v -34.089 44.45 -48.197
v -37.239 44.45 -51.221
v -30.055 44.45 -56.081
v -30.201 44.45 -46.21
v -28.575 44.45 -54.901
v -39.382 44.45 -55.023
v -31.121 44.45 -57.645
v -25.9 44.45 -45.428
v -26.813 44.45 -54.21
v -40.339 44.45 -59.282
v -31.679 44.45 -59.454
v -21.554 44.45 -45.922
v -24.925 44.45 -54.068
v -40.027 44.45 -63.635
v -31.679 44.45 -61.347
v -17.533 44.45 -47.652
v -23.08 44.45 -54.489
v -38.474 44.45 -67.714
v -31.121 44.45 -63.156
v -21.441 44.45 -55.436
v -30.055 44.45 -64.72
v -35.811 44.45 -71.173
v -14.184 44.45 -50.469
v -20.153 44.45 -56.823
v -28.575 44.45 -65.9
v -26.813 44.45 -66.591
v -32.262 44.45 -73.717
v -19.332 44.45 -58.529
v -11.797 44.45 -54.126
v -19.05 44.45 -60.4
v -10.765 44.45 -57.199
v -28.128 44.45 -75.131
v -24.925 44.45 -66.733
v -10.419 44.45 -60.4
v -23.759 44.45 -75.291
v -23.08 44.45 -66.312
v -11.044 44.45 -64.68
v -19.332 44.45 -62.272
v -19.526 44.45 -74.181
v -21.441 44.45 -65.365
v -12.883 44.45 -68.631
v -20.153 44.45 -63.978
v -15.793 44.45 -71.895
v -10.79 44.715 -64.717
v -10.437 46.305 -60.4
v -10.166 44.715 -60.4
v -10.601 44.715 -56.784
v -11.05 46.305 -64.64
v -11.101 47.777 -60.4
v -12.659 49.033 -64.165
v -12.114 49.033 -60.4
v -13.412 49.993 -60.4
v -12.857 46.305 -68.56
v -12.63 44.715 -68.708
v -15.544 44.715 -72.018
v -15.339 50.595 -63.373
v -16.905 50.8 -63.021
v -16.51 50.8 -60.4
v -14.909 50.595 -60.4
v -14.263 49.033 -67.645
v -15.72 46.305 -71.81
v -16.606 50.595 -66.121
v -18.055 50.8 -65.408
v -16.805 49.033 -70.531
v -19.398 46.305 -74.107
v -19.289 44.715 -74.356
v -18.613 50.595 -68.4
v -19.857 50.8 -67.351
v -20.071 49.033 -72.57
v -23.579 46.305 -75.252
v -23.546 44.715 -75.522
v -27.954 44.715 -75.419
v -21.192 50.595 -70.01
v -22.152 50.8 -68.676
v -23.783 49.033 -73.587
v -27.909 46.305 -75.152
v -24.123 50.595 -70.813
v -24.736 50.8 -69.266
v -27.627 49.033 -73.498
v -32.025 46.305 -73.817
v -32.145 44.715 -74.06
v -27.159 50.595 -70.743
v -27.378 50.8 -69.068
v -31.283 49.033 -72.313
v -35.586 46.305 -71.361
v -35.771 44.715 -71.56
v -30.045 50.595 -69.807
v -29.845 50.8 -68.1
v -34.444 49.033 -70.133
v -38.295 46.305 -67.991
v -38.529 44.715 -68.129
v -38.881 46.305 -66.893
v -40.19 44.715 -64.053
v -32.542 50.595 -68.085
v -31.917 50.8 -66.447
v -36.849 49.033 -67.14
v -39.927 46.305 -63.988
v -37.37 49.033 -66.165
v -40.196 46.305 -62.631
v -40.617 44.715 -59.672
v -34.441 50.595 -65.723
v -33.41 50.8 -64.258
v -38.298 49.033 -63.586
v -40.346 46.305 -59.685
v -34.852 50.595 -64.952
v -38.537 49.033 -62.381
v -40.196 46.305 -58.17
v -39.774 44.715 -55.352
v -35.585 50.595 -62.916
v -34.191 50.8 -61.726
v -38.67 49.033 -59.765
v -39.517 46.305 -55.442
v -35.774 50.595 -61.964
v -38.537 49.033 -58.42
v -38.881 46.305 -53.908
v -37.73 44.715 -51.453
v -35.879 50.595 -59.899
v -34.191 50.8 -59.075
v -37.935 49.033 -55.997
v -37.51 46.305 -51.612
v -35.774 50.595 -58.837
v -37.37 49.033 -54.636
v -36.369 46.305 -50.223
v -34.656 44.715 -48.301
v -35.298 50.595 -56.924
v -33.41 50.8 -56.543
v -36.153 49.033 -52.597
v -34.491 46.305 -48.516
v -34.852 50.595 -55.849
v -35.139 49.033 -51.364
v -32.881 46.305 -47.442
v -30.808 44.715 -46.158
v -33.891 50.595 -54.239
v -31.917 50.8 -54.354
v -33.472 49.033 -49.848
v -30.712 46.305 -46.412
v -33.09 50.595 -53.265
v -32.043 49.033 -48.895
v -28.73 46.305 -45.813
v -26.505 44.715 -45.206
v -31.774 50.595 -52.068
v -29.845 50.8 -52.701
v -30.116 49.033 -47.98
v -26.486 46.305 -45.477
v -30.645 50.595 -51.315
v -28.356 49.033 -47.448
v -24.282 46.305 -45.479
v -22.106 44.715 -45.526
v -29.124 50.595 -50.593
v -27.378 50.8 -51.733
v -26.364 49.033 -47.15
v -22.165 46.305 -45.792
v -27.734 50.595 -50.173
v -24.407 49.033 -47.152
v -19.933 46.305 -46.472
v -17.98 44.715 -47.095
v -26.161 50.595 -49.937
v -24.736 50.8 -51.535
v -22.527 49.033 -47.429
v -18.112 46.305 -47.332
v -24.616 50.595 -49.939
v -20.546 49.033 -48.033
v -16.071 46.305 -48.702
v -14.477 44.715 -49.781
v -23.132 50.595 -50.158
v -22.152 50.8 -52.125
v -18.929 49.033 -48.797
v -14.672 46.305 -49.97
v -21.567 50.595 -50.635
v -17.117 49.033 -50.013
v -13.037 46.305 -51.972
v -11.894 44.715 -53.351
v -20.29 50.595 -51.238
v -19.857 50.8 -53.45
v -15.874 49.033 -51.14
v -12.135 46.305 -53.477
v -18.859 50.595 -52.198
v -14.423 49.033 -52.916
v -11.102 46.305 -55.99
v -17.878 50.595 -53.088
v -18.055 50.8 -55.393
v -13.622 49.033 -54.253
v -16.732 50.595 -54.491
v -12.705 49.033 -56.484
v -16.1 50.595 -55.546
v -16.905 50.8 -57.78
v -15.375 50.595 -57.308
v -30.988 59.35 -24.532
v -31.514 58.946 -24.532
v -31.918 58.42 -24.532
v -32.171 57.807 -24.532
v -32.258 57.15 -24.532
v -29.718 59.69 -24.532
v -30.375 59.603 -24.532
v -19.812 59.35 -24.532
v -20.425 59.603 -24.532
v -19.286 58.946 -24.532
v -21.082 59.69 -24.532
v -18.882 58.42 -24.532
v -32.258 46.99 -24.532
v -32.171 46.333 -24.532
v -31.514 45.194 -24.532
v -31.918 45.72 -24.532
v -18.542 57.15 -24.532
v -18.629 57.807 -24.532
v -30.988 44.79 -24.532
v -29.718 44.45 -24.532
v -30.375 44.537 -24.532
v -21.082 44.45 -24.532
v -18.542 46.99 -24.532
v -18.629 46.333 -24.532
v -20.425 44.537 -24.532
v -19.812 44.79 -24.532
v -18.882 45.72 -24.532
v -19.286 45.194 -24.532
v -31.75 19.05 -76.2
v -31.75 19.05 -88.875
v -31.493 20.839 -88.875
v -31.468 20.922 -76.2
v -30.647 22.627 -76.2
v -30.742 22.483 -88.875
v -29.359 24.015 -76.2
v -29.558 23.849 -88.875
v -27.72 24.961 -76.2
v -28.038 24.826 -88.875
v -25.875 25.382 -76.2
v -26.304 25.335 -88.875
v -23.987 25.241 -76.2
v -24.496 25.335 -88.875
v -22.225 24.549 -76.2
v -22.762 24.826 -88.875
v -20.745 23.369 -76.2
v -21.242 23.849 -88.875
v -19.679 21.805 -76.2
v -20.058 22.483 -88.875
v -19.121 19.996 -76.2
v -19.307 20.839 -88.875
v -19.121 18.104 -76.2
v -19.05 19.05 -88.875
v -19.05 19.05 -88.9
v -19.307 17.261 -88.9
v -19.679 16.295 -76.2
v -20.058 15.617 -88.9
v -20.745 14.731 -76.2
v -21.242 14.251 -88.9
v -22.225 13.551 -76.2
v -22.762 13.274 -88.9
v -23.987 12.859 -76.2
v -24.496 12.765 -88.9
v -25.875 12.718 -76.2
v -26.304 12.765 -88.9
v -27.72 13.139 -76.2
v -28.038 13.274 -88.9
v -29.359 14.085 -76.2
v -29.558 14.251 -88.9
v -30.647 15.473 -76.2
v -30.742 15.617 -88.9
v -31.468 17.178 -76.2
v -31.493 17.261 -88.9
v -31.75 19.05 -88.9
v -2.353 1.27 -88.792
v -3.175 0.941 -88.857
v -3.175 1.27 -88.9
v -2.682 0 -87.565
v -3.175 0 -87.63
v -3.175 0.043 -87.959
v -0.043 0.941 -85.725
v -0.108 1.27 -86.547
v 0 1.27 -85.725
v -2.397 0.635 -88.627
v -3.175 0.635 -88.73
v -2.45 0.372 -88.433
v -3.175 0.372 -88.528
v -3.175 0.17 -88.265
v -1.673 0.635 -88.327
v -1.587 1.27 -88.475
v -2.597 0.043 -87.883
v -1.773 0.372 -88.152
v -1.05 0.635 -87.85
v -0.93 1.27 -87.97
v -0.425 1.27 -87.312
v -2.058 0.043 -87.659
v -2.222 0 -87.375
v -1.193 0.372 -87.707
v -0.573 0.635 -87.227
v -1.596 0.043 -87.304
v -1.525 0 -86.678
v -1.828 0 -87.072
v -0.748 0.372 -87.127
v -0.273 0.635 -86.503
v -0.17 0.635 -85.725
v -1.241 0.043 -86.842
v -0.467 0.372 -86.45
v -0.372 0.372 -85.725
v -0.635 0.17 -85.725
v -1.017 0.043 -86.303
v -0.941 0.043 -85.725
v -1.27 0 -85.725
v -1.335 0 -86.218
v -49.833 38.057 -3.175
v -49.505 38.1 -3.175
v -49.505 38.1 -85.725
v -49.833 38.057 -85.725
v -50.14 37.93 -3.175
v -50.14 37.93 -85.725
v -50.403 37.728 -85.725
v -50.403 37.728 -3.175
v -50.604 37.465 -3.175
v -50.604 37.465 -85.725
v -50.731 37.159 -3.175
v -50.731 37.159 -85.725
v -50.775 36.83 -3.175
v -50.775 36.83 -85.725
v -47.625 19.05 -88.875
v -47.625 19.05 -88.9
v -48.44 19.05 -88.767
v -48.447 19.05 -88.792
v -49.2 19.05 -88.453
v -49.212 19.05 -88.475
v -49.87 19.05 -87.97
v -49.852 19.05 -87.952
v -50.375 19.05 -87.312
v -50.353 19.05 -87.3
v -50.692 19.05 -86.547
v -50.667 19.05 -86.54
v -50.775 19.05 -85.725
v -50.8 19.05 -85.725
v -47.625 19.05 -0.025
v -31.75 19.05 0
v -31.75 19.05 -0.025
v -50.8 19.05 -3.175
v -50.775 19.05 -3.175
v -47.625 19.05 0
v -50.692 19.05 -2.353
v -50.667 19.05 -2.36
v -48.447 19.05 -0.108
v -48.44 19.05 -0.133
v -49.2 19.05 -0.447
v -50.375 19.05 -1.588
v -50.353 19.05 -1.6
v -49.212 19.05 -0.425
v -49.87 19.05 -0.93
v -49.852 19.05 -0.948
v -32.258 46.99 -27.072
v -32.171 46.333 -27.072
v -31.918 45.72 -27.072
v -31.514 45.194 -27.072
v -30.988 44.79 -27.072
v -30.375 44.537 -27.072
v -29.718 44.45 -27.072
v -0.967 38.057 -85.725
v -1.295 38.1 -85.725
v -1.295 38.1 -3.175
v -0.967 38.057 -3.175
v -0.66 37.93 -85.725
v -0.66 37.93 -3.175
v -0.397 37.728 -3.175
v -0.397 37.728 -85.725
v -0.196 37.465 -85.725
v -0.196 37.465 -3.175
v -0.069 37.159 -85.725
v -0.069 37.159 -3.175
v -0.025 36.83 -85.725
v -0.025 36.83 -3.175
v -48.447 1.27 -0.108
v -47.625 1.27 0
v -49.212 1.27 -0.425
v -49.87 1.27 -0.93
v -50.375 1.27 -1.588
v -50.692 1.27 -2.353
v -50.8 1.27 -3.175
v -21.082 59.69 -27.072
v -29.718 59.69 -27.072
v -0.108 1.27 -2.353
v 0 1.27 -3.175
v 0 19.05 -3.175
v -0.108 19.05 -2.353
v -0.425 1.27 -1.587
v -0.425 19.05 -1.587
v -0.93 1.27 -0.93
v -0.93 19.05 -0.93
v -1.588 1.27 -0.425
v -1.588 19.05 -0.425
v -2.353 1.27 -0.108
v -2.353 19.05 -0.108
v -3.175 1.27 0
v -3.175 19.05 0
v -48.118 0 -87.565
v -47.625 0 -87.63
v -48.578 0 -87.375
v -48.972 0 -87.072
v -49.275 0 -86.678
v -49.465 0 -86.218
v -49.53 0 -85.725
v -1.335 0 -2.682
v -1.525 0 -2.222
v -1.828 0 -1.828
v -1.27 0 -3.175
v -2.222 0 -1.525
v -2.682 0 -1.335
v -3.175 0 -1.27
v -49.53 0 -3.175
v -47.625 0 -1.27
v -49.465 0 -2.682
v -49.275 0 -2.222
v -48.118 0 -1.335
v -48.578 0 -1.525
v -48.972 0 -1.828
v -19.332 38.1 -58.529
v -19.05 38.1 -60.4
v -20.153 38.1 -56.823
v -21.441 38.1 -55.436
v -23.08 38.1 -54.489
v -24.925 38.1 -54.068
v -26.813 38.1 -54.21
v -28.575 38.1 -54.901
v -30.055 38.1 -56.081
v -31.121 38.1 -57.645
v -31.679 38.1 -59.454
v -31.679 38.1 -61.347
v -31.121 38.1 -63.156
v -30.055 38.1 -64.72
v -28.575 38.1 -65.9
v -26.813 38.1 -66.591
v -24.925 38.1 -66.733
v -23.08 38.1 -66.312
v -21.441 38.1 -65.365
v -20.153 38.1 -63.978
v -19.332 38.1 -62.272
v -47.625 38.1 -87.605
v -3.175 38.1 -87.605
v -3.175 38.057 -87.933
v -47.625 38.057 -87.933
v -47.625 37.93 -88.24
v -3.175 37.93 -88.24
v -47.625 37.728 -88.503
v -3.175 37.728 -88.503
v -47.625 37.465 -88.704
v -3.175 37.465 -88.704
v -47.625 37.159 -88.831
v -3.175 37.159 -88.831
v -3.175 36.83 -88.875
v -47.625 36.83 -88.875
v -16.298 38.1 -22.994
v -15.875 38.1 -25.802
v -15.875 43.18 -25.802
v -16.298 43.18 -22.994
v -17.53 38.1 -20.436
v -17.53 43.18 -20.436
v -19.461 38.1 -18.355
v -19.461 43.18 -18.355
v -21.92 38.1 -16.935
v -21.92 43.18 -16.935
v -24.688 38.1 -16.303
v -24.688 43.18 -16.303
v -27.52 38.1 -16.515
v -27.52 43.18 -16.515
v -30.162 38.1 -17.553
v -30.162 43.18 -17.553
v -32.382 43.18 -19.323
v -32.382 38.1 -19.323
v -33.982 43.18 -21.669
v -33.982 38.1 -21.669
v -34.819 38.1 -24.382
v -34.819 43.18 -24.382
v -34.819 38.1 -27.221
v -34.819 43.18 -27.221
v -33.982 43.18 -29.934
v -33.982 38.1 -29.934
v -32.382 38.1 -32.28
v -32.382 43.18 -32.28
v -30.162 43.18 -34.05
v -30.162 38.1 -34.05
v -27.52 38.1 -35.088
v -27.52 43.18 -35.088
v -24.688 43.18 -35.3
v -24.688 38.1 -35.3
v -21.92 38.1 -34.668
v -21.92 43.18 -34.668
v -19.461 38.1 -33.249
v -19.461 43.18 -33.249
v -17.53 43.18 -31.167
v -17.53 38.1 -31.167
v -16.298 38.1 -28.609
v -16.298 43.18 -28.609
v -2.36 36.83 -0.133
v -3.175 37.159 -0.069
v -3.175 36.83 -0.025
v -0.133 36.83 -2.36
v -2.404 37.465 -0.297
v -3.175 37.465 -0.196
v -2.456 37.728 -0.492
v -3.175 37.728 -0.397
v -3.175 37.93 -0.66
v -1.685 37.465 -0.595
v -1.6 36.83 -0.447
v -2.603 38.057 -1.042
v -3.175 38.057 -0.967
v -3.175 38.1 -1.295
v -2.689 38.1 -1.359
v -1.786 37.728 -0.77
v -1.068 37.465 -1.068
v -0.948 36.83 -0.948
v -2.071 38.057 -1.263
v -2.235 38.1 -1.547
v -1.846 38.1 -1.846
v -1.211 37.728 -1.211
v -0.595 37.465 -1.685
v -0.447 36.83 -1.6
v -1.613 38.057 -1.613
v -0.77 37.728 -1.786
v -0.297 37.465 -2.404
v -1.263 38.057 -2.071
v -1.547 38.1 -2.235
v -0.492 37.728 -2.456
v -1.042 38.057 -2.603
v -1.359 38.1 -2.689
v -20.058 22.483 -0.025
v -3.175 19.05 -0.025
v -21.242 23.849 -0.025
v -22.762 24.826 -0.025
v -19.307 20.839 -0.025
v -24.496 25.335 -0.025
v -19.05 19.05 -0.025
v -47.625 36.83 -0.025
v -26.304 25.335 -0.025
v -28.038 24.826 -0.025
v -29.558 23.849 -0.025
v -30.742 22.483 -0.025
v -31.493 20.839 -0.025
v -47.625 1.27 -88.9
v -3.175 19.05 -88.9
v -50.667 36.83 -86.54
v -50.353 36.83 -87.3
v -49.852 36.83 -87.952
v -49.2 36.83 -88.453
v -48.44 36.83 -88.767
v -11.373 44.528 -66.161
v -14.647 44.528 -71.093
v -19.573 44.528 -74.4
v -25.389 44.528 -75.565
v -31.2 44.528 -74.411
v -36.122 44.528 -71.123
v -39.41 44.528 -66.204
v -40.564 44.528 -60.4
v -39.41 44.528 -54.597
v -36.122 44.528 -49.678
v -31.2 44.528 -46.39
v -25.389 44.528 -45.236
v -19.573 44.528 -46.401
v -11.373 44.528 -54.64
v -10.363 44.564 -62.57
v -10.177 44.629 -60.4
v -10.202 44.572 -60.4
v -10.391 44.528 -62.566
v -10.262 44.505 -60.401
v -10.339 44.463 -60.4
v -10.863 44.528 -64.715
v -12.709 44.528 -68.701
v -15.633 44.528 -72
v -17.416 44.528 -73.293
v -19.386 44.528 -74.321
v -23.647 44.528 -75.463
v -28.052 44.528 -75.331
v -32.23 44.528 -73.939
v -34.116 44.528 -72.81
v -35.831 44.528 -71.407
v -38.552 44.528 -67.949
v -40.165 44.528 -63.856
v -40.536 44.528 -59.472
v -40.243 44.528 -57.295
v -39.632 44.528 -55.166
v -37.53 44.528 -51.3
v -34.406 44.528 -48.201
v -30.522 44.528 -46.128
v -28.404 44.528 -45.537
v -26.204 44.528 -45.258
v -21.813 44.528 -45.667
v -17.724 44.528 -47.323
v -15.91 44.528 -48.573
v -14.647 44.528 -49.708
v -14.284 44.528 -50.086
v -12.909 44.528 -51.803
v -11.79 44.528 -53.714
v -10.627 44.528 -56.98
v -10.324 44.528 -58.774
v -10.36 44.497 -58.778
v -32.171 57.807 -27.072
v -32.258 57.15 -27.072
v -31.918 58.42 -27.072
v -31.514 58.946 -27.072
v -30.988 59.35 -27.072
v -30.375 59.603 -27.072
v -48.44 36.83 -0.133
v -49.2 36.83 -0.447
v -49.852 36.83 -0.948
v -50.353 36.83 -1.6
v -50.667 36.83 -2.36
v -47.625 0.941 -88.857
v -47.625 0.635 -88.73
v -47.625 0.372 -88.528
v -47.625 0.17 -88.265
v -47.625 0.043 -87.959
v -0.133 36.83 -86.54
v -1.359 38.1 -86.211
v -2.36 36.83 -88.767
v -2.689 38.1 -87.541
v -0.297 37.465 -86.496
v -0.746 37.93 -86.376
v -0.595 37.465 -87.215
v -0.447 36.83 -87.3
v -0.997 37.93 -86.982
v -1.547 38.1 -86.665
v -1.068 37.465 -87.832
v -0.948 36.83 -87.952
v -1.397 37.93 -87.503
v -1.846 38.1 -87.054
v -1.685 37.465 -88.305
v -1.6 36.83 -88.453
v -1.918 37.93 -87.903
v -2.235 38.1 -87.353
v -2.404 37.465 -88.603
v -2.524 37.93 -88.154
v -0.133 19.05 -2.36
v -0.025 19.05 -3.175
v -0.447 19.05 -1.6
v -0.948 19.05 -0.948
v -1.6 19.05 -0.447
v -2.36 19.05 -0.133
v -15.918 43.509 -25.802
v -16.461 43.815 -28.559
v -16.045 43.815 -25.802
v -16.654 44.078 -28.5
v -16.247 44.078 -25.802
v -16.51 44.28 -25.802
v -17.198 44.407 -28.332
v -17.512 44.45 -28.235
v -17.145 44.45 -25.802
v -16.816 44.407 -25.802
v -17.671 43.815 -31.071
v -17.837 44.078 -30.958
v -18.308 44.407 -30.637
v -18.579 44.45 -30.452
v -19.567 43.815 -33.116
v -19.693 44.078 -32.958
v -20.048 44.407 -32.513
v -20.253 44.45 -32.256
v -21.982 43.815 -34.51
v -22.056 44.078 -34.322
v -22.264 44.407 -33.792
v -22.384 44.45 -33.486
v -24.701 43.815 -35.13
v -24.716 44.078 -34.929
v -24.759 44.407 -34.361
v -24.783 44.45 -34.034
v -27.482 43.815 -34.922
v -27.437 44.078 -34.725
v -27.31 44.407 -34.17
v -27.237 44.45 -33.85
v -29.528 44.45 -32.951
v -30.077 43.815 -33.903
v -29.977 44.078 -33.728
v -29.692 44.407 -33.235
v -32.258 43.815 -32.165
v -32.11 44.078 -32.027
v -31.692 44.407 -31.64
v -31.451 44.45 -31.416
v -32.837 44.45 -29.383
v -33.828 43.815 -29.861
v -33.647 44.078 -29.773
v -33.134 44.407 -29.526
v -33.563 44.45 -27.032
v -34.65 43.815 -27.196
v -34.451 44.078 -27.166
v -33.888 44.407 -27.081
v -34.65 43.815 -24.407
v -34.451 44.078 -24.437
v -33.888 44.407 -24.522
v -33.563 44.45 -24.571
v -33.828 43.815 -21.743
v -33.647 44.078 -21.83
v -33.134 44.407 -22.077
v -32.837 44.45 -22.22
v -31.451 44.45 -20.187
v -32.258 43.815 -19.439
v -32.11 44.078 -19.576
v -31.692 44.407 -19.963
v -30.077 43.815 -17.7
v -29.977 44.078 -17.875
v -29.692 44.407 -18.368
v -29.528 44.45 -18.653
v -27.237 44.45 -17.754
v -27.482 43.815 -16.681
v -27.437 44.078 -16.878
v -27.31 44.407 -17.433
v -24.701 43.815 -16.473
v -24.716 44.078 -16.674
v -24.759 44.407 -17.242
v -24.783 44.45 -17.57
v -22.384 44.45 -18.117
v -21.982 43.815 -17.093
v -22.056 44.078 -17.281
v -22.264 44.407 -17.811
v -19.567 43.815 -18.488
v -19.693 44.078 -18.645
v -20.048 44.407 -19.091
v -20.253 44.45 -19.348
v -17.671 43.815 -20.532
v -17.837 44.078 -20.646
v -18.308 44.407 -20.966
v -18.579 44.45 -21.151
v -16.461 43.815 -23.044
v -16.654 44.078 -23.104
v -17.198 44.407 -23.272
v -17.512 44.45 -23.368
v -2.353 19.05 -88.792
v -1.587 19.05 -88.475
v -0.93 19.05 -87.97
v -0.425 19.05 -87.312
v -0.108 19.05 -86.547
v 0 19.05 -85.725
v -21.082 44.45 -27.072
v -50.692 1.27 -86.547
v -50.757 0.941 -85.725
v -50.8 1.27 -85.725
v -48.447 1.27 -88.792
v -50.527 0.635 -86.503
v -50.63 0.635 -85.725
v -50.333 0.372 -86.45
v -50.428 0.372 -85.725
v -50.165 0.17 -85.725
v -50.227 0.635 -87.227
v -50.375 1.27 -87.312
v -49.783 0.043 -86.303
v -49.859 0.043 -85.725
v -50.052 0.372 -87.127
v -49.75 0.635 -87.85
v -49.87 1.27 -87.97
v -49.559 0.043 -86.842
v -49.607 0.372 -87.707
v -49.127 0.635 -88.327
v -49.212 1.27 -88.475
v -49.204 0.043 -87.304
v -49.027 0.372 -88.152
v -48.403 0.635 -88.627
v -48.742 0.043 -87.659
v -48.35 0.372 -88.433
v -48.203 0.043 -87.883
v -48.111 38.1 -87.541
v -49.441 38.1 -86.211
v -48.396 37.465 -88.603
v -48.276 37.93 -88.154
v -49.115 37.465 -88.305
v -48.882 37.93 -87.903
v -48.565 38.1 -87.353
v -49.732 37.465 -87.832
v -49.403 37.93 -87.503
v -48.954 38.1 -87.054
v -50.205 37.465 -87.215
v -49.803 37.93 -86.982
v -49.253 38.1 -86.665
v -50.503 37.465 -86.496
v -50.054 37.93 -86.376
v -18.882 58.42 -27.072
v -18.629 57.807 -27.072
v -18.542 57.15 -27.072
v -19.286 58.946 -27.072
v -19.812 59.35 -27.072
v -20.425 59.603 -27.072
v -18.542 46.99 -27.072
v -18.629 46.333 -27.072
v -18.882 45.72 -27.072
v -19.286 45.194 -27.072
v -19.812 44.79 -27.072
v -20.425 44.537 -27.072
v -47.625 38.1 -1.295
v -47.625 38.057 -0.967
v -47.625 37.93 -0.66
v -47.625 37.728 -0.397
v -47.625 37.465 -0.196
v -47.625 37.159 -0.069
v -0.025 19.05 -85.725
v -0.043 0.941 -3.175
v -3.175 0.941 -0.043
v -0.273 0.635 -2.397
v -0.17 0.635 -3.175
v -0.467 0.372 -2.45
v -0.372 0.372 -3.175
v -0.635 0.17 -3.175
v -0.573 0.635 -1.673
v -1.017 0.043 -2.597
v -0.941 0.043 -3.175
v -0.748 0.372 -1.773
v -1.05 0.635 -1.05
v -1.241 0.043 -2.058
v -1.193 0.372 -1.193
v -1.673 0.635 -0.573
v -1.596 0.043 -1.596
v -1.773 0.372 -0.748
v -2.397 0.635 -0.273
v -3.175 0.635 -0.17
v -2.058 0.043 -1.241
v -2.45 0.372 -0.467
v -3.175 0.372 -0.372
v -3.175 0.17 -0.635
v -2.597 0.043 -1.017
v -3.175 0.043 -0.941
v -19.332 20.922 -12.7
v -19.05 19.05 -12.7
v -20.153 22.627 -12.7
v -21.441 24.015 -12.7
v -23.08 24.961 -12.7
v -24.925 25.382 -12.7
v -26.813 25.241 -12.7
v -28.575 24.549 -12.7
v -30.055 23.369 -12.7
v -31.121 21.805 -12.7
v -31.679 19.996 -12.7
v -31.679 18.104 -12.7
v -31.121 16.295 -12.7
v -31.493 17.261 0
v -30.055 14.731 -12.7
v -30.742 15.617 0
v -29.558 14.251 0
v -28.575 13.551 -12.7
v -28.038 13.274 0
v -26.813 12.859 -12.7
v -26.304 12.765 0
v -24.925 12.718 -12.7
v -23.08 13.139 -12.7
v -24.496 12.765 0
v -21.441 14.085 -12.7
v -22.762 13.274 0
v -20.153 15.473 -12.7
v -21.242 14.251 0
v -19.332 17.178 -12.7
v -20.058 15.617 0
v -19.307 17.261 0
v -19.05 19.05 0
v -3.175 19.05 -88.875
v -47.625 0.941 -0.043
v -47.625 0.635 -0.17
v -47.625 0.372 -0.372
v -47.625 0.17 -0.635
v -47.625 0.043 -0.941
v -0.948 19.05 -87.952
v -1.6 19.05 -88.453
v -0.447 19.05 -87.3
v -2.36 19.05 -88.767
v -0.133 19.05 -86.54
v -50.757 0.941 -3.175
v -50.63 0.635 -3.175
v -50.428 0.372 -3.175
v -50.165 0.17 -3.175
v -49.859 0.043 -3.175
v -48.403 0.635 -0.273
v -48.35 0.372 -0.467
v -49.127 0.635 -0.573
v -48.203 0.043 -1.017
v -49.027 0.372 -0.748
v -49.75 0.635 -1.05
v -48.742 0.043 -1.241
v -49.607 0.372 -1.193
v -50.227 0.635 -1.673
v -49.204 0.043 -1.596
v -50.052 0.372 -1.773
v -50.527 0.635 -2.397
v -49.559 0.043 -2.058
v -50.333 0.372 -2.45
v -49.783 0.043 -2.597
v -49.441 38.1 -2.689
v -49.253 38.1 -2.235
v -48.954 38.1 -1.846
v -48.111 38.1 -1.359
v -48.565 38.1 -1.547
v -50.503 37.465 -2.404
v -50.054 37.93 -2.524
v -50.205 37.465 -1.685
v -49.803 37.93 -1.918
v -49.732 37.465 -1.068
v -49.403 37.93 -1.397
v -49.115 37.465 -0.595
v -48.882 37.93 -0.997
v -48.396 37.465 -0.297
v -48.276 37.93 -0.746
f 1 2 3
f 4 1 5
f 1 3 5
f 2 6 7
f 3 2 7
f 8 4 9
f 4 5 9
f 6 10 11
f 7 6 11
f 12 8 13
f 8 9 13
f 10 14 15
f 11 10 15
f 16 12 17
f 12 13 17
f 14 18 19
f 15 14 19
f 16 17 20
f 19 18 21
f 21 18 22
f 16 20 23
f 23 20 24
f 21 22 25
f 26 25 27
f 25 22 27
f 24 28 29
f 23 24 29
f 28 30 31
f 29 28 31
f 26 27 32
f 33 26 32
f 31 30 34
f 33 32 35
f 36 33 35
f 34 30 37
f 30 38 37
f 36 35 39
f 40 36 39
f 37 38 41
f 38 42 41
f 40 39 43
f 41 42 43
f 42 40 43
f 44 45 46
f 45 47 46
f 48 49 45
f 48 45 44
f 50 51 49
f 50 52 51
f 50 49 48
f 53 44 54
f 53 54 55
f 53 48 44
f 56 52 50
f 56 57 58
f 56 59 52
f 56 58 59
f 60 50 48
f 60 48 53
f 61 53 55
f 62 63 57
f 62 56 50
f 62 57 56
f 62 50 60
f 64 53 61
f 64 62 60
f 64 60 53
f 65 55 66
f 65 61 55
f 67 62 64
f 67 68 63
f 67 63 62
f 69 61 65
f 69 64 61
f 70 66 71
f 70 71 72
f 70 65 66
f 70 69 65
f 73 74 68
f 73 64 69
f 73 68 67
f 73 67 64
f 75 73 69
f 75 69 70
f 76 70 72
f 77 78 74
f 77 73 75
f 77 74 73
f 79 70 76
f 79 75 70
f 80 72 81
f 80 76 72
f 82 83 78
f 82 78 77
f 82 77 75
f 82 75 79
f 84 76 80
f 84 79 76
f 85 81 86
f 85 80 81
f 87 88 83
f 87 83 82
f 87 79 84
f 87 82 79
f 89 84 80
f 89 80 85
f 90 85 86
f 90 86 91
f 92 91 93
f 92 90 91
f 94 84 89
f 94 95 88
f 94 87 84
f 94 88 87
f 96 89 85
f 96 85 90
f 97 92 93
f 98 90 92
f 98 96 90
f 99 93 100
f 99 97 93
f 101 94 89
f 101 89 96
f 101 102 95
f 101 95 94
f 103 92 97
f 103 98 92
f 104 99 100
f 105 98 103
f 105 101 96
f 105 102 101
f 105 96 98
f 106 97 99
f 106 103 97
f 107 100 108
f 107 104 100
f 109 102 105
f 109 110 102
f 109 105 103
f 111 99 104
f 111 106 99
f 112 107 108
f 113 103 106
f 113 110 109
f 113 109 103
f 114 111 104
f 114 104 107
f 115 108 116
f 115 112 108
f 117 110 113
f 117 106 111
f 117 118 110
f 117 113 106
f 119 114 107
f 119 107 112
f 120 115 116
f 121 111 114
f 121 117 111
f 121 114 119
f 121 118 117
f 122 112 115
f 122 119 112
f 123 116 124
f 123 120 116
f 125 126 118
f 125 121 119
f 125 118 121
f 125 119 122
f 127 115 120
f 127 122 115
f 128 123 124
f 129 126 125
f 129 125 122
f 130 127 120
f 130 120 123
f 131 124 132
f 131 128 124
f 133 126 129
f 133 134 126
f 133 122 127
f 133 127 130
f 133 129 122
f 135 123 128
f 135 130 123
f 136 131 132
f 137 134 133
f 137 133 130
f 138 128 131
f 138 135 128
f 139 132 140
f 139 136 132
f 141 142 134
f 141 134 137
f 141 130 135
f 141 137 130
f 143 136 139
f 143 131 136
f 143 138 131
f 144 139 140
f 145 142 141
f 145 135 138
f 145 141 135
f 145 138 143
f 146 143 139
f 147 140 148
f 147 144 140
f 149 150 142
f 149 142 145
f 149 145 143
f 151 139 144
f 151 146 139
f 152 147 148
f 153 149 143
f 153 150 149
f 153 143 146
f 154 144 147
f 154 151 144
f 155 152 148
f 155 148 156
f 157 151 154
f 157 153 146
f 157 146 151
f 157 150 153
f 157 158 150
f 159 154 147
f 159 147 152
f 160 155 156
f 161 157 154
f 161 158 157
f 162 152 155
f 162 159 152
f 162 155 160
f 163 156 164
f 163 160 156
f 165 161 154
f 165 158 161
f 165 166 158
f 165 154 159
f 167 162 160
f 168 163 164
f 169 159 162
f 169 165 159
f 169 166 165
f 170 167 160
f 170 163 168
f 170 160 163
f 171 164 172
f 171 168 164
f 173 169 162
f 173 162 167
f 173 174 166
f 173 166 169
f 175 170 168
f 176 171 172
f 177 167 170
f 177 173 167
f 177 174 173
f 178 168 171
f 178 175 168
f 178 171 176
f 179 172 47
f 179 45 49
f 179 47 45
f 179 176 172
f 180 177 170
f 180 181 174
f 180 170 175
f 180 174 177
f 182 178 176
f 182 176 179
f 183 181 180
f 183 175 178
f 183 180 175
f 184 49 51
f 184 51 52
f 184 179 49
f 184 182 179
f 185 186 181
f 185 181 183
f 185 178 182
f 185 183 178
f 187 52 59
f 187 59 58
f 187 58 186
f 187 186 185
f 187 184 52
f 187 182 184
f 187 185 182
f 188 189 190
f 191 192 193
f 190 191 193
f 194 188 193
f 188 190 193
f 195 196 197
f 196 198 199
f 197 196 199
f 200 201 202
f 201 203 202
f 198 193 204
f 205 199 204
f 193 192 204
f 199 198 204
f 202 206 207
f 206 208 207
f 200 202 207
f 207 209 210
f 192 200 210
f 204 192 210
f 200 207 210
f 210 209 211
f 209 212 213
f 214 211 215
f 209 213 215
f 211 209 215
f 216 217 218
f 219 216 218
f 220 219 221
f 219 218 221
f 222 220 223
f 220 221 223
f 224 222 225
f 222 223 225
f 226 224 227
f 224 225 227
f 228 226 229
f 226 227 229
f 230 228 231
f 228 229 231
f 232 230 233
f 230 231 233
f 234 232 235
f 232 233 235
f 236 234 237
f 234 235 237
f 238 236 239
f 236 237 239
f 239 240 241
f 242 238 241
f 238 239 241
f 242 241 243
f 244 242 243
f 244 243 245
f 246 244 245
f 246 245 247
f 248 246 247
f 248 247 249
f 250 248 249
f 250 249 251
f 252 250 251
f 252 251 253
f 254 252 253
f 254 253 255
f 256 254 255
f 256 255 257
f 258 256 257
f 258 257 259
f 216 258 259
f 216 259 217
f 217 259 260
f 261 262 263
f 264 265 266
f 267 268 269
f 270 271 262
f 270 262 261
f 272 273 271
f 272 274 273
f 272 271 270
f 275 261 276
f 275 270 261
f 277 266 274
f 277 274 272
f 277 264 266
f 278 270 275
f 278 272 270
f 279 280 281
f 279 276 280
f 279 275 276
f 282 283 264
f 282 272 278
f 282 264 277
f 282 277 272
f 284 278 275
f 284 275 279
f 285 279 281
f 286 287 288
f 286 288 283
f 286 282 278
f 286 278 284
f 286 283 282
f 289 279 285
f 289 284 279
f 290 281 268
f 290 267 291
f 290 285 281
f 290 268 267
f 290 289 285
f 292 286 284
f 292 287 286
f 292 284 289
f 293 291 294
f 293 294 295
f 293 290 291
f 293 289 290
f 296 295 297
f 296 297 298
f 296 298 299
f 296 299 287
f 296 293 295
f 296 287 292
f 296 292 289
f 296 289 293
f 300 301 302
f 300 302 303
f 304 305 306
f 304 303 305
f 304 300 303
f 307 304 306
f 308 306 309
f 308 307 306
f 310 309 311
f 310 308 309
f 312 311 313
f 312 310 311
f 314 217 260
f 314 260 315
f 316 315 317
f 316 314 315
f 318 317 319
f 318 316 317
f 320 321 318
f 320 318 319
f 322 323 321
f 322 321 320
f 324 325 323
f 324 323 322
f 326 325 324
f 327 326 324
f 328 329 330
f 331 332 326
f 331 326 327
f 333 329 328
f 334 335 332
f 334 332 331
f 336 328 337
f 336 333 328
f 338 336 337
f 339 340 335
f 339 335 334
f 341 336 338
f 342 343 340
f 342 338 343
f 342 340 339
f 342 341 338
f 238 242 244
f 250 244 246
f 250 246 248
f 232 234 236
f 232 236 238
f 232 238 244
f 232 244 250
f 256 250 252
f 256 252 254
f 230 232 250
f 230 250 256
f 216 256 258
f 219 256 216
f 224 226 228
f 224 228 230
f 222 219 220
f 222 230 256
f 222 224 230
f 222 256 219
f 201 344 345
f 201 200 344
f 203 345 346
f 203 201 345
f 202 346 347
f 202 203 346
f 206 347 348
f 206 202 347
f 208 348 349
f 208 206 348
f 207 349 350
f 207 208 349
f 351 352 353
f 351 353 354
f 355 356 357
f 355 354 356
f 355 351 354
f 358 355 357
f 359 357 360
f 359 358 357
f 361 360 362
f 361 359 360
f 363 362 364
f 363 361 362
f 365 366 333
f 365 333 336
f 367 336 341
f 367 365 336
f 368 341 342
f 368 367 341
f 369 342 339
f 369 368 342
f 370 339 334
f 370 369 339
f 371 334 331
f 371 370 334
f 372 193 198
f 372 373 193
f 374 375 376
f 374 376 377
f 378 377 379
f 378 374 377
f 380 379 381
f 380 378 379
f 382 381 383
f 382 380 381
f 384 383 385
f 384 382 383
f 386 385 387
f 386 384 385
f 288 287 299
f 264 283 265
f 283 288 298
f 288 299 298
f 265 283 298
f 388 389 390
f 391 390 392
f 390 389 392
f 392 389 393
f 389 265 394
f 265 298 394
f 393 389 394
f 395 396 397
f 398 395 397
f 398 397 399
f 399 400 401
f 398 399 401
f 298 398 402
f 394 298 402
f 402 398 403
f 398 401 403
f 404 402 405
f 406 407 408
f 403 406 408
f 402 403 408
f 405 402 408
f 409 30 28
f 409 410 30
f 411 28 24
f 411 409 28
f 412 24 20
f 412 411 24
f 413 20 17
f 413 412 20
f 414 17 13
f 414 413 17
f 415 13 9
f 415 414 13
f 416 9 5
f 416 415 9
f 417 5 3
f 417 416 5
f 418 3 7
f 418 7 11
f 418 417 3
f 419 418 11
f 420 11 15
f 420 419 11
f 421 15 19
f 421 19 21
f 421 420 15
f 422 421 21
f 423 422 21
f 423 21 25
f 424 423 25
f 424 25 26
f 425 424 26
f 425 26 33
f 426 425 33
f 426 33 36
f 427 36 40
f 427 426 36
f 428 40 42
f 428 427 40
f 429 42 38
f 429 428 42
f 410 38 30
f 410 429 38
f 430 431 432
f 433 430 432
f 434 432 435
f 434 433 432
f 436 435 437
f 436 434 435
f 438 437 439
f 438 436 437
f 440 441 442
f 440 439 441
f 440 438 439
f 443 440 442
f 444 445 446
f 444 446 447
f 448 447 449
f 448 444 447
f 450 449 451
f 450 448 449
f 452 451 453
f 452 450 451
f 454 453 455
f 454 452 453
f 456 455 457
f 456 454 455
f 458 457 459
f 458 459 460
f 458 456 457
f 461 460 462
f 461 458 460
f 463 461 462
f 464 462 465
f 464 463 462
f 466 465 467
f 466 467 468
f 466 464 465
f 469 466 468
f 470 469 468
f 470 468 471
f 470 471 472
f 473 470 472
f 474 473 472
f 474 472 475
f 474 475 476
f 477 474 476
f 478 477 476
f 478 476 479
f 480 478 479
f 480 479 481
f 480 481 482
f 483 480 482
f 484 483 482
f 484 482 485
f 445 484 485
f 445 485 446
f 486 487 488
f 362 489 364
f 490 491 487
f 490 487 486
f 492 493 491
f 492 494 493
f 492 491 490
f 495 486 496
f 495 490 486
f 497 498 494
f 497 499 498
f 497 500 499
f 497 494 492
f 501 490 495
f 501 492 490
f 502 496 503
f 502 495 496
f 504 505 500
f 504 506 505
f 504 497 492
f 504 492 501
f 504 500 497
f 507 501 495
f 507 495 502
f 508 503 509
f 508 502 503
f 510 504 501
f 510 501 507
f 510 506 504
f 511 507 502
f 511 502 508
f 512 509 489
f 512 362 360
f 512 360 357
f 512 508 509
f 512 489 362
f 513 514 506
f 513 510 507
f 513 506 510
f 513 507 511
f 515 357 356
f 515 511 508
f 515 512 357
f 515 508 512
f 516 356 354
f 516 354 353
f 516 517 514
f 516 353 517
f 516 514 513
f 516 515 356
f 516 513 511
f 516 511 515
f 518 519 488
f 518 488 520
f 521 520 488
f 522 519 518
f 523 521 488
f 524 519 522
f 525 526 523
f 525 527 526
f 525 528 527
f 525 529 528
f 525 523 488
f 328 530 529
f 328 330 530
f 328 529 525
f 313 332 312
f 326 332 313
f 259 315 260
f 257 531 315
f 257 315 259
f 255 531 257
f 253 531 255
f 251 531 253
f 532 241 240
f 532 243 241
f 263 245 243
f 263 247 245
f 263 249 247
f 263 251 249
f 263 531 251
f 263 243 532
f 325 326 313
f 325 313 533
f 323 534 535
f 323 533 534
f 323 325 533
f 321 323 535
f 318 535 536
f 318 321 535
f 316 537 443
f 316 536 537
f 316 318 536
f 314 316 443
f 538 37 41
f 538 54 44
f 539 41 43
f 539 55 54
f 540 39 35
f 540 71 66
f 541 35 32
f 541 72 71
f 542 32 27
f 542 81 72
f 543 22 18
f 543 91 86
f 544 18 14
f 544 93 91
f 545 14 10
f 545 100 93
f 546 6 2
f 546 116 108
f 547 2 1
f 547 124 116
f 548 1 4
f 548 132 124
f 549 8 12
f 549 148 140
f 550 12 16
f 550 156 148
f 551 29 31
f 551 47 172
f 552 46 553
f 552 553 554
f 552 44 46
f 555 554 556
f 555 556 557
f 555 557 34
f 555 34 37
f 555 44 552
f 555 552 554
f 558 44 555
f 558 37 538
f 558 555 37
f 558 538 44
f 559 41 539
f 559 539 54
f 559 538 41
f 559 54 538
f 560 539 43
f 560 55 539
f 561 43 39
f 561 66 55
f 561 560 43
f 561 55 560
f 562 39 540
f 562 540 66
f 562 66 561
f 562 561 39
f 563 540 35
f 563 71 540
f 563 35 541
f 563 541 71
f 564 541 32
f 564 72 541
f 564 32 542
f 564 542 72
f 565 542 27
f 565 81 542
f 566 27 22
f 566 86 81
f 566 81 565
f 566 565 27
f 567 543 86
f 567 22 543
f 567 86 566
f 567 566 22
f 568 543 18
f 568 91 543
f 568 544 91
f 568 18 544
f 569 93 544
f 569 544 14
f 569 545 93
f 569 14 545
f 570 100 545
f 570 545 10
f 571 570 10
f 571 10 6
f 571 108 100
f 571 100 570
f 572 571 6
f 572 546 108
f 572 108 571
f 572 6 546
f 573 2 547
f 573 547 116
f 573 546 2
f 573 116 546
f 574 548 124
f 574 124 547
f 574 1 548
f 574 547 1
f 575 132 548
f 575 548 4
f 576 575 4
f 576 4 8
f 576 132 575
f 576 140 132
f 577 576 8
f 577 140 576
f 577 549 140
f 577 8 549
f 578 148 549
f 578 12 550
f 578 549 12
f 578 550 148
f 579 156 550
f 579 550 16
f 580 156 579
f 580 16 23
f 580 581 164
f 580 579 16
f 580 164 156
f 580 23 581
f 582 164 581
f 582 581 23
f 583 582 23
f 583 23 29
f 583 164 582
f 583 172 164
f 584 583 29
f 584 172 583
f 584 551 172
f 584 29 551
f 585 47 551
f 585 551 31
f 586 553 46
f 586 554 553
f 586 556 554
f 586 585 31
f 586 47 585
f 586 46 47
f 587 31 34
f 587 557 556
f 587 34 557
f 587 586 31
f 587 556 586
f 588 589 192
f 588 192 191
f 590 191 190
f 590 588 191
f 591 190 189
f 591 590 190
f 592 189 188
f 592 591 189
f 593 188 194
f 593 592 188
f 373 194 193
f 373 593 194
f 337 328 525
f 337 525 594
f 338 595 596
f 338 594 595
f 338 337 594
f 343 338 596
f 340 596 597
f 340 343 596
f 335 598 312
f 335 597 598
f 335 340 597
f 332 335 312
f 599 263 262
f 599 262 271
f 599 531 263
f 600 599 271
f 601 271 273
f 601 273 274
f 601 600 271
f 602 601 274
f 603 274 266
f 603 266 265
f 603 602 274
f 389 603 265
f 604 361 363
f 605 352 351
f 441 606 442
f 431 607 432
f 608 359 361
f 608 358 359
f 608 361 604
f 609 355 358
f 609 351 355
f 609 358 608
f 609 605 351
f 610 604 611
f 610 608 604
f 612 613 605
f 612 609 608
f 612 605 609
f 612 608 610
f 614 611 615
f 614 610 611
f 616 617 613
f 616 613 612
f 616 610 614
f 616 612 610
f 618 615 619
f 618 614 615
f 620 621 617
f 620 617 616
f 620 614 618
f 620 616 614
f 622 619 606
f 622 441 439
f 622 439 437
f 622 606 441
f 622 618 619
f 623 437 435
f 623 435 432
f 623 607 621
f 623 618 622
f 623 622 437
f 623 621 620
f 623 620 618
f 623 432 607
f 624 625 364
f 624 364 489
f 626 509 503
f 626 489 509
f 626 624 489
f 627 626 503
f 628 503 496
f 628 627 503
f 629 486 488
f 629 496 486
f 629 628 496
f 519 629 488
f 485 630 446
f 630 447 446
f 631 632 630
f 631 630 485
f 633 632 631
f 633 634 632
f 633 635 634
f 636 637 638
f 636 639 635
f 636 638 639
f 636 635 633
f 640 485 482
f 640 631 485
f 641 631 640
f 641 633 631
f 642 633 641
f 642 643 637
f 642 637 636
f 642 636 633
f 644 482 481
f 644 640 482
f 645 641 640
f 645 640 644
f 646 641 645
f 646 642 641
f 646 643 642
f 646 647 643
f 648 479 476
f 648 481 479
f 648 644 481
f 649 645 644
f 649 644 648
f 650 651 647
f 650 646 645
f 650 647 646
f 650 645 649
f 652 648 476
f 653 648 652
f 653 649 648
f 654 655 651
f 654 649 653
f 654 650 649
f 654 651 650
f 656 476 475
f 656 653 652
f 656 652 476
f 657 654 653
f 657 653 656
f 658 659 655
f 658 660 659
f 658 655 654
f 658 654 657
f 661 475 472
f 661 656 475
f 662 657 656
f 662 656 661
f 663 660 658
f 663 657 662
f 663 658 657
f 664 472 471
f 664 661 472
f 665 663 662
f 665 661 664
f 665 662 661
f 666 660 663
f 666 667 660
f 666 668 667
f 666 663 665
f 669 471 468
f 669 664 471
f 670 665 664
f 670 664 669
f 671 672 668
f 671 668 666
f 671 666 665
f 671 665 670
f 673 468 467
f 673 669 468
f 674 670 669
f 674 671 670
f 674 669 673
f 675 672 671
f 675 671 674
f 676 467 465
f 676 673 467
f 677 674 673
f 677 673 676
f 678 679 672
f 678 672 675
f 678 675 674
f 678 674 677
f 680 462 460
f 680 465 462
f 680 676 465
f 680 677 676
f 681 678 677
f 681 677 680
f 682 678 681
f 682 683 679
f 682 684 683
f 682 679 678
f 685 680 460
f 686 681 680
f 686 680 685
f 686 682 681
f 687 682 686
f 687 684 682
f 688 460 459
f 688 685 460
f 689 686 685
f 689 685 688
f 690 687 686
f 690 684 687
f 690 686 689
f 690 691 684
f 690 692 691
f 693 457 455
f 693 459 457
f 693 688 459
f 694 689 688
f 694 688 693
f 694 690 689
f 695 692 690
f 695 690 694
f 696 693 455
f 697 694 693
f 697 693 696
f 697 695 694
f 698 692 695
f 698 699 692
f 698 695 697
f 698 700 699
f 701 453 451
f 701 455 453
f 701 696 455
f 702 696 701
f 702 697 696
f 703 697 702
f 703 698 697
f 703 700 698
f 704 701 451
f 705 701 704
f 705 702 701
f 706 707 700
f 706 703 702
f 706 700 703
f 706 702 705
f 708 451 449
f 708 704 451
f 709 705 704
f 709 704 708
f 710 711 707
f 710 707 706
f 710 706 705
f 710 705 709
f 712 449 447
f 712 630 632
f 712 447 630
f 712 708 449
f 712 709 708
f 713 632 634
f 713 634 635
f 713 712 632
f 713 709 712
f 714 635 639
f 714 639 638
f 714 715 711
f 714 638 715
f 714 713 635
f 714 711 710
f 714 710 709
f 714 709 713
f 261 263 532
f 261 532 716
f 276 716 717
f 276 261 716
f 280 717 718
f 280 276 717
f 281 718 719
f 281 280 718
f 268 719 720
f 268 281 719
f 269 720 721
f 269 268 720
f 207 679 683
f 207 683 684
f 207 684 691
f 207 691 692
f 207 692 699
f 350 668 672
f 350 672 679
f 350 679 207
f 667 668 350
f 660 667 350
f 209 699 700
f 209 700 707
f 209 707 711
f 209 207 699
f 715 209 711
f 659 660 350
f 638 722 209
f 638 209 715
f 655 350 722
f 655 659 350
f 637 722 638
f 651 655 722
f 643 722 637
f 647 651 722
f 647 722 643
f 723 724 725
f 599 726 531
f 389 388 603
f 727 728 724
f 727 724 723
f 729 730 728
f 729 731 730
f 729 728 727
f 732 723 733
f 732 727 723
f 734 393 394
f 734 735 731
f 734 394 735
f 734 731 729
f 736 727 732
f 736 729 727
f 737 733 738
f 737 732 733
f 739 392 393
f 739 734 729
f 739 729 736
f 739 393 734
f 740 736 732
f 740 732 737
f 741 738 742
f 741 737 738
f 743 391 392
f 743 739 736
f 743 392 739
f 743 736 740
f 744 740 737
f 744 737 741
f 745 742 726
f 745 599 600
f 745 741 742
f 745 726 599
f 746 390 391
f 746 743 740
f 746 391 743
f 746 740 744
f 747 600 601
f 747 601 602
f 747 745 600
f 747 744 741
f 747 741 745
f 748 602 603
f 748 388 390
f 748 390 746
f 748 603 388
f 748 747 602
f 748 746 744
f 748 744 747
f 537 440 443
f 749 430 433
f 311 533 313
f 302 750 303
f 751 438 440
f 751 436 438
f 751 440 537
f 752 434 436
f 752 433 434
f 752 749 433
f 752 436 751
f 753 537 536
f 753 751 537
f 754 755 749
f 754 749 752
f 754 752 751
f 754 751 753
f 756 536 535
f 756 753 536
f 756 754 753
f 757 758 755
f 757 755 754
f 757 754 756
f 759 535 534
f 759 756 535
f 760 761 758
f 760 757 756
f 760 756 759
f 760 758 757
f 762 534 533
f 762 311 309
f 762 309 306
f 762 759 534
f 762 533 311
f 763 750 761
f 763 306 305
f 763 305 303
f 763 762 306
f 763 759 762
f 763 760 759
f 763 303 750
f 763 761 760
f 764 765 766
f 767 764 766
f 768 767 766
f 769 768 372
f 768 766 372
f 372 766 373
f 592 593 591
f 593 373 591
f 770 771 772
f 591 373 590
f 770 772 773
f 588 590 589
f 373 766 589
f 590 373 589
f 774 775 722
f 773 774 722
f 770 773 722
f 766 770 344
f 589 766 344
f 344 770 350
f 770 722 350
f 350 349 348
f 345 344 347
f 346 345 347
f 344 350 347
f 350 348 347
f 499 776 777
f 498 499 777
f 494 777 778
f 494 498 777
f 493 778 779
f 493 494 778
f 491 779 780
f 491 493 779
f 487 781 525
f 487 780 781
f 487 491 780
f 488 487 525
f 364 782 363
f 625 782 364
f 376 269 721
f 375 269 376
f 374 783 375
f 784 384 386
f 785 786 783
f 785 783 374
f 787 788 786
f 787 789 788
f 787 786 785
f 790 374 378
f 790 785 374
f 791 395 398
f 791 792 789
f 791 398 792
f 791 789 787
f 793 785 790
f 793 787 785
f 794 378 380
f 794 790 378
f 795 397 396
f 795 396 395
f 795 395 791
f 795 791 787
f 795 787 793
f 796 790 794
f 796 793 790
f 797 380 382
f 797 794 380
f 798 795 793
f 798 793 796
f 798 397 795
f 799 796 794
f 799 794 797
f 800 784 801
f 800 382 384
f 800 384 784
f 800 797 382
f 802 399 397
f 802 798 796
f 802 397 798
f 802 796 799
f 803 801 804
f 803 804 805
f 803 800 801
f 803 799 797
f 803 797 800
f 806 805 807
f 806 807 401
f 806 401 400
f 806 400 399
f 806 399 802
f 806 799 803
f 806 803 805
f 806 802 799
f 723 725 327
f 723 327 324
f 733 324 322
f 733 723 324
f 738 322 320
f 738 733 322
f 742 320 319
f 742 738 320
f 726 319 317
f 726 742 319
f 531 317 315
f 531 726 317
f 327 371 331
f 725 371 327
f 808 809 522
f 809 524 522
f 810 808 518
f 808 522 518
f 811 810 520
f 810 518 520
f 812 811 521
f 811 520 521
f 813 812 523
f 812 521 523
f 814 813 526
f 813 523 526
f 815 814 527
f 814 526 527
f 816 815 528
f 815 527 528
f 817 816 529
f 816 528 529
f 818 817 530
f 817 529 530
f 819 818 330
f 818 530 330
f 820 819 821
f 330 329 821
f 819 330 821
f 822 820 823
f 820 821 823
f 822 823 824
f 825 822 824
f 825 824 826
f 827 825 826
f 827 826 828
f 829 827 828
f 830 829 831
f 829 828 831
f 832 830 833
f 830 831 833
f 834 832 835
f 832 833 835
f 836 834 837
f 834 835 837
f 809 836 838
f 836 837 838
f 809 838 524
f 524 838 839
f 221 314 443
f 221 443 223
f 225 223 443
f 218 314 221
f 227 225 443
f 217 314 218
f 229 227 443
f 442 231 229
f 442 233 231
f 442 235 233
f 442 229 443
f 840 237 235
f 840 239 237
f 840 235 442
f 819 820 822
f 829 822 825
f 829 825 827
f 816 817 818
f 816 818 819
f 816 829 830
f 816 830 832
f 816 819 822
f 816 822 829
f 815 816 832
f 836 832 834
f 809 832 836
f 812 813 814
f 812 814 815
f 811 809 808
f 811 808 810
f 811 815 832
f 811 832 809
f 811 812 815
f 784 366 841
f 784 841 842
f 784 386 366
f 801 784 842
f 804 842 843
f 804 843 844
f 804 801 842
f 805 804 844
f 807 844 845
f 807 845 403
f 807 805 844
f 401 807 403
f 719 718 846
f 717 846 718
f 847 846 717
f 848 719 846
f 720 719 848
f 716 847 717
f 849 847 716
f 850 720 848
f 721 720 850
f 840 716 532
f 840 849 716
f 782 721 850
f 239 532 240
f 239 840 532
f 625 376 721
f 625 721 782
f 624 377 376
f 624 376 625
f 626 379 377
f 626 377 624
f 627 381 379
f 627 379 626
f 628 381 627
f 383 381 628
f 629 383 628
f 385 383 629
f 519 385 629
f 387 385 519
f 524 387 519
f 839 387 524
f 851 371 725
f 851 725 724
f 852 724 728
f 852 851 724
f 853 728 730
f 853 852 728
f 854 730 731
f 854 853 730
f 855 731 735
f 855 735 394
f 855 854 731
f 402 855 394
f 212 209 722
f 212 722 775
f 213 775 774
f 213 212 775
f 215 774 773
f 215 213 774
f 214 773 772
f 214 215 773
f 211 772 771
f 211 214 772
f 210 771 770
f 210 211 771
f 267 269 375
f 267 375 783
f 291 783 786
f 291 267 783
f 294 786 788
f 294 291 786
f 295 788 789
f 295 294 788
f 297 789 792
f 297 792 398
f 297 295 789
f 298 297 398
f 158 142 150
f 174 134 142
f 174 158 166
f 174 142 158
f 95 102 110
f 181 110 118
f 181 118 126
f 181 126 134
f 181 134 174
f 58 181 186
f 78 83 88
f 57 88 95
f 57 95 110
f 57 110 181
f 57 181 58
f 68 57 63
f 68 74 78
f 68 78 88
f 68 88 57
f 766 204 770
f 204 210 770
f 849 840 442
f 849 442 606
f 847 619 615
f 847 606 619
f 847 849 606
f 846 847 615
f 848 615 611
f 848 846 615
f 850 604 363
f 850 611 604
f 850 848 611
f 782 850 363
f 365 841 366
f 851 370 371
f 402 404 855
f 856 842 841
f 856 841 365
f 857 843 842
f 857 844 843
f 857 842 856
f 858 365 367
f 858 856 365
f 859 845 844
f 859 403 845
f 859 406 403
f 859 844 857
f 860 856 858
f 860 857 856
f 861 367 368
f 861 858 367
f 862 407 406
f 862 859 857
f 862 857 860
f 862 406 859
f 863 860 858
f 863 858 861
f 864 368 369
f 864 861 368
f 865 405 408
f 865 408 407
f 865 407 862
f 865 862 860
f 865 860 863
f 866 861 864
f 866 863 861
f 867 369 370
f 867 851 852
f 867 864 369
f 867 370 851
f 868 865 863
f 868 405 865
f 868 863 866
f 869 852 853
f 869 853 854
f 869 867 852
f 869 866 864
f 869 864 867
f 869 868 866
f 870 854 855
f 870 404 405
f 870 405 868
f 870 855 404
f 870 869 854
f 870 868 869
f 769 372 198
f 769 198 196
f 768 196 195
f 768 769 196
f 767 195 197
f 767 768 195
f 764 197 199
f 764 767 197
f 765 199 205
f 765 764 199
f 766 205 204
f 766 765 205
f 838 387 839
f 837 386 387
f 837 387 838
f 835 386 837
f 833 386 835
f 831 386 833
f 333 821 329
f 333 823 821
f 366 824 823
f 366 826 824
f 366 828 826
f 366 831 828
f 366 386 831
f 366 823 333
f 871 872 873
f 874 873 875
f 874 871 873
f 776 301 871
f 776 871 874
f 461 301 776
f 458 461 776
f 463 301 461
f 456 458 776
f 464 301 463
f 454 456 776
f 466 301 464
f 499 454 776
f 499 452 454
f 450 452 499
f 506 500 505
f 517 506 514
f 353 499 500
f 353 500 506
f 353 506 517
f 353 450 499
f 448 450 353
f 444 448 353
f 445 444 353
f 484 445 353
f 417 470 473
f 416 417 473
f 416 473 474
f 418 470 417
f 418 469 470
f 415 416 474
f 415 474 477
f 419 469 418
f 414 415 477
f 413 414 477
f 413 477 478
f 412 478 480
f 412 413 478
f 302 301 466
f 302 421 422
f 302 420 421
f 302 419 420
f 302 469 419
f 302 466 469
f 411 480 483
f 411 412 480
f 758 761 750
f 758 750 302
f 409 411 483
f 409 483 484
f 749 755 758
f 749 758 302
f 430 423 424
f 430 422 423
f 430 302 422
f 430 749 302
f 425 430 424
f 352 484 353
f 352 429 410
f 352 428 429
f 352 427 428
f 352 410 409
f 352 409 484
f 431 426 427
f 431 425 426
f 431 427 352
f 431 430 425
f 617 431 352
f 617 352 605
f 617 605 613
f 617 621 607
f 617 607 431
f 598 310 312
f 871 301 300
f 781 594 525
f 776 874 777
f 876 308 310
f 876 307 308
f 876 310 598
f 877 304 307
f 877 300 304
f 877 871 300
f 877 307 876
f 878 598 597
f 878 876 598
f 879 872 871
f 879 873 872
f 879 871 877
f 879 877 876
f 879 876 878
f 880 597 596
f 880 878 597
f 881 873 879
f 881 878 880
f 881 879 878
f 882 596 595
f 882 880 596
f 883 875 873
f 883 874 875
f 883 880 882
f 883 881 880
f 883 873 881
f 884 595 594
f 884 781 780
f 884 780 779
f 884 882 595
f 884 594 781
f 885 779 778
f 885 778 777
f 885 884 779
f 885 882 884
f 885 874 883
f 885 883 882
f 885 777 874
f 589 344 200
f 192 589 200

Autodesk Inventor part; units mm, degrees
ref_plane "YZ Plane" through (0, 0, 0) normal (1, 0, 0) x (0, 1, 0)
ref_plane "XZ Plane" through (0, 0, 0) normal (0, 1, 0) x (-1, 0, 0)
ref_plane "XY Plane" through (0, 0, 0) normal (0, 0, 1) x (1, 0, 0)
sketch "Sketch1" plane through (0, 0, 0) normal (0, 1, 0) x (-1, 0, 0)
  line L0 (3.175, 0) -> (47.625, 0)
  line L1 (50.8, -3.175) -> (50.8, -85.725)
  line L2 (47.625, -88.9) -> (3.175, -88.9)
  line L3 (0, -85.725) -> (0, -3.175)
  arc A0 (50.8, -3.175) -> (47.625, 0) centre (47.625, -3.175) ccw
  arc A1 (47.625, -88.9) -> (50.8, -85.725) centre (47.625, -85.725) ccw
  arc A2 (0, -85.725) -> (3.175, -88.9) centre (3.175, -85.725) ccw
  arc A3 (3.175, 0) -> (0, -3.175) centre (3.175, -3.175) ccw
  point P0 (0, 0)
  point P1 (50.8, -88.9)
  point P2 (50.8, 0)
  point P3 (0, -88.9)
  dimension "d0" = 50.8
  dimension "d1" = 88.9
  dimension "d2" = 3.175
extrude "Extrusion1" add sketch "Sketch1" along normal blind 19.05
sketch "Sketch2" plane through (0, 19.05, 0) normal (0, 1, 0) x (1, 0, 0)
  line L0 (-3.175, 88.9) -> (-47.625, 88.9) projected
  arc A0 (-47.625, 88.9) -> (-50.8, 85.725) centre (-47.625, 85.725) ccw projected
  line L1 (-50.8, 85.725) -> (-50.8, 3.175) projected
  arc A1 (-50.8, 3.175) -> (-47.625, 0) centre (-47.625, 3.175) ccw projected
  line L2 (-47.625, 0) -> (-3.175, 0) projected
  arc A2 (-3.175, 0) -> (0, 3.175) centre (-3.175, 3.175) ccw projected
  line L3 (0, 3.175) -> (0, 85.725) projected
  arc A3 (0, 85.725) -> (-3.175, 88.9) centre (-3.175, 85.725) ccw projected
  line L4 (-50.7746, 3.175) -> (-50.7746, 85.725)
  arc A4 (-47.625, 88.8746) -> (-50.7746, 85.725) centre (-47.625, 85.725) ccw
  line L5 (-47.625, 88.8746) -> (-3.175, 88.8746)
  arc A5 (-0.0254, 85.725) -> (-3.175, 88.8746) centre (-3.175, 85.725) ccw
  line L6 (-0.0254, 85.725) -> (-0.0254, 3.175)
  arc A6 (-3.175, 0.0254) -> (-0.0254, 3.175) centre (-3.175, 3.175) ccw
  line L7 (-3.175, 0.0254) -> (-47.625, 0.0254)
  arc A7 (-50.7746, 3.175) -> (-47.625, 0.0254) centre (-47.625, 3.175) ccw
  point P0 (0, 0)
  dimension "d6" = 0.0254
extrude "Extrusion2" add sketch "Sketch2" along normal blind 19.05 contours L4 A4 L5 A5 L6 A6 L7 A7
fillet "Fillet2" radius 1.27 16 edges at (-0.9479, 38.1, -0.9479) (-0.0254, 38.1, -44.45) (-0.9479, 38.1, -87.9521) (-25.4, 38.1, -88.8746) (-49.8521, 38.1, -87.9521) (-50.7746, 38.1, -44.45) (-49.8521, 38.1, -0.9479) (-25.4, 38.1, -0.0254) (-0.9299, 0, -0.9299) (0, 0, -44.45) (-0.9299, 0, -87.9701) (-25.4, 0, -88.9) (-49.8701, 0, -87.9701) (-50.8, 0, -44.45) (-49.8701, 0, -0.9299) (-25.4, 0, 0)
sketch "Sketch3" plane through (0, 38.1, 0) normal (0, 1, 0) x (1, 0, 0)
  line L0 (-3.175, 1.2954) -> (-47.625, 1.2954) projected
  line L1 (-25.4, 1.2954) -> (-25.4, 87.6046)
  line L2 (-47.625, 87.6046) -> (-3.175, 87.6046) projected
  circle A0 centre (-25.4, 60.4005) radius 6.35
  circle A1 centre (-25.4, 25.8016) radius 9.525
  point P0 (0, 0)
  dimension "d10" = 12.7
  dimension "d11" = 19.05
extrude "Extrusion3" add sketch "Sketch3" along normal blind 6.35
fillet "Fillet3" radius 1.27 1 edges at (-34.925, 44.45, -25.8016)
sketch "Sketch4" plane through (-25.4, 44.45, -60.4005) normal (0, 1, 0) x (1, 0, 0)
  circle A0 centre (0, 0) radius 15.24
  point P0 (25.4, -60.4005)
  dimension "d15" = 30.48
extrude "Extrusion4" add sketch "Sketch4" along normal blind 6.35
fillet "Fillet4" radius 6.35 1 edges at (-40.64, 50.8, -60.4005)
fillet "Fillet5" radius 0.254 2 edges at (-40.64, 44.4501, -60.4005) (-40.64, 44.45, -60.4005)
sketch "Sketch5" plane through (-25.4, 44.45, -25.8016) normal (0, 1, 0) x (1, 0, 0)
  circle A0 centre (0, 0) radius 8.255 projected
  line L0 (0, 0) -> (-6.858, 0)
  line L1 (-6.858, 0) -> (-6.858, -1.27)
  line L2 (-6.858, -1.27) -> (0, -1.27)
  line L3 (0, -1.27) -> (0, 0)
  line L4 (-6.858, -1.27) -> (6.858, -1.27)
  line L5 (6.858, -1.27) -> (6.858, 1.27)
  line L6 (6.858, 1.27) -> (-6.858, 1.27)
  line L7 (-6.858, 1.27) -> (-6.858, -1.27)
  point P0 (25.4, -25.8016)
  point P1 (0, -1.27)
  point P2 (-6.858, 0)
  dimension "d20" = 6.858
  dimension "d21" = 1.27
  dimension "d22" = 13.716
  dimension "d23" = 2.54
extrude "Extrusion5" add sketch "Sketch5" along normal blind 15.24 contours L3 L2 L1 L0 | L0 L7 L6 L5 L4 L3
fillet "Fillet6" radius 2.54 2 edges at (-18.542, 59.69, -25.8016) (-32.258, 59.69, -25.8016)
sketch "Sketch6" plane through (-32.258, 44.45, -24.5316) normal (0, 0, 1) x (1, 0, 0)
  arc A0 (2.54, 15.24) -> (0, 12.7) centre (2.54, 12.7) ccw projected
  line L0 (0, 0) -> (0, 12.7) projected
  line L1 (13.716, 0) -> (0, 0) projected
  line L2 (13.716, 0) -> (13.716, 12.7) projected
  arc A1 (13.716, 12.7) -> (11.176, 15.24) centre (11.176, 12.7) ccw projected
  line L3 (2.54, 15.24) -> (11.176, 15.24) projected
  line L4 (0, 0) -> (2.54, 0)
  line L5 (2.54, 0) -> (2.54, 2.54)
  line L6 (2.54, 2.54) -> (0, 2.54)
  line L7 (0, 2.54) -> (0, 0)
  line L8 (13.716, 0) -> (11.176, 0)
  line L9 (11.176, 0) -> (11.176, 2.54)
  line L10 (11.176, 2.54) -> (13.716, 2.54)
  line L11 (13.716, 2.54) -> (13.716, 0)
  circle A2 centre (2.54, 2.54) radius 2.54
  circle A3 centre (11.176, 2.54) radius 2.54
  point P0 (32.258, -44.45)
  point P1 (13.716, 2.54)
  point P2 (0, 2.54)
  dimension "d27" = 2.54
  dimension "d28" = 2.54
  dimension "d29" = 2.54
  dimension "d30" = 2.54
extrude "Extrusion6" cut sketch "Sketch6" against normal blind 15.24 contours A2 L1 L0 | L2 L1 A3
sketch "Sketch7" plane through (-47.625, 19.05, 0) normal (0, 0, 1) x (1, 0, 0)
  line L0 (44.45, 0) -> (0, 0) projected
  circle A0 centre (22.225, 0) radius 6.35
  point P0 (47.625, -19.05)
  dimension "d33" = 12.7
sketch "Sketch8" plane through (-3.175, 19.05, -88.9) normal (0, 0, -1) x (-1, 0, 0)
  line L0 (0, 0) -> (44.45, 0) projected
  circle A0 centre (22.225, 0) radius 6.35
  point P0 (-3.175, -19.05)
  dimension "d34" = 12.7
extrude "Extrusion7" cut sketch "Sketch8" along normal blind 25.4 and the other way blind 12.7
extrude "Extrusion8" cut sketch "Sketch7" along normal blind 25.4 and the other way blind 12.7
properties part number "Estop"
